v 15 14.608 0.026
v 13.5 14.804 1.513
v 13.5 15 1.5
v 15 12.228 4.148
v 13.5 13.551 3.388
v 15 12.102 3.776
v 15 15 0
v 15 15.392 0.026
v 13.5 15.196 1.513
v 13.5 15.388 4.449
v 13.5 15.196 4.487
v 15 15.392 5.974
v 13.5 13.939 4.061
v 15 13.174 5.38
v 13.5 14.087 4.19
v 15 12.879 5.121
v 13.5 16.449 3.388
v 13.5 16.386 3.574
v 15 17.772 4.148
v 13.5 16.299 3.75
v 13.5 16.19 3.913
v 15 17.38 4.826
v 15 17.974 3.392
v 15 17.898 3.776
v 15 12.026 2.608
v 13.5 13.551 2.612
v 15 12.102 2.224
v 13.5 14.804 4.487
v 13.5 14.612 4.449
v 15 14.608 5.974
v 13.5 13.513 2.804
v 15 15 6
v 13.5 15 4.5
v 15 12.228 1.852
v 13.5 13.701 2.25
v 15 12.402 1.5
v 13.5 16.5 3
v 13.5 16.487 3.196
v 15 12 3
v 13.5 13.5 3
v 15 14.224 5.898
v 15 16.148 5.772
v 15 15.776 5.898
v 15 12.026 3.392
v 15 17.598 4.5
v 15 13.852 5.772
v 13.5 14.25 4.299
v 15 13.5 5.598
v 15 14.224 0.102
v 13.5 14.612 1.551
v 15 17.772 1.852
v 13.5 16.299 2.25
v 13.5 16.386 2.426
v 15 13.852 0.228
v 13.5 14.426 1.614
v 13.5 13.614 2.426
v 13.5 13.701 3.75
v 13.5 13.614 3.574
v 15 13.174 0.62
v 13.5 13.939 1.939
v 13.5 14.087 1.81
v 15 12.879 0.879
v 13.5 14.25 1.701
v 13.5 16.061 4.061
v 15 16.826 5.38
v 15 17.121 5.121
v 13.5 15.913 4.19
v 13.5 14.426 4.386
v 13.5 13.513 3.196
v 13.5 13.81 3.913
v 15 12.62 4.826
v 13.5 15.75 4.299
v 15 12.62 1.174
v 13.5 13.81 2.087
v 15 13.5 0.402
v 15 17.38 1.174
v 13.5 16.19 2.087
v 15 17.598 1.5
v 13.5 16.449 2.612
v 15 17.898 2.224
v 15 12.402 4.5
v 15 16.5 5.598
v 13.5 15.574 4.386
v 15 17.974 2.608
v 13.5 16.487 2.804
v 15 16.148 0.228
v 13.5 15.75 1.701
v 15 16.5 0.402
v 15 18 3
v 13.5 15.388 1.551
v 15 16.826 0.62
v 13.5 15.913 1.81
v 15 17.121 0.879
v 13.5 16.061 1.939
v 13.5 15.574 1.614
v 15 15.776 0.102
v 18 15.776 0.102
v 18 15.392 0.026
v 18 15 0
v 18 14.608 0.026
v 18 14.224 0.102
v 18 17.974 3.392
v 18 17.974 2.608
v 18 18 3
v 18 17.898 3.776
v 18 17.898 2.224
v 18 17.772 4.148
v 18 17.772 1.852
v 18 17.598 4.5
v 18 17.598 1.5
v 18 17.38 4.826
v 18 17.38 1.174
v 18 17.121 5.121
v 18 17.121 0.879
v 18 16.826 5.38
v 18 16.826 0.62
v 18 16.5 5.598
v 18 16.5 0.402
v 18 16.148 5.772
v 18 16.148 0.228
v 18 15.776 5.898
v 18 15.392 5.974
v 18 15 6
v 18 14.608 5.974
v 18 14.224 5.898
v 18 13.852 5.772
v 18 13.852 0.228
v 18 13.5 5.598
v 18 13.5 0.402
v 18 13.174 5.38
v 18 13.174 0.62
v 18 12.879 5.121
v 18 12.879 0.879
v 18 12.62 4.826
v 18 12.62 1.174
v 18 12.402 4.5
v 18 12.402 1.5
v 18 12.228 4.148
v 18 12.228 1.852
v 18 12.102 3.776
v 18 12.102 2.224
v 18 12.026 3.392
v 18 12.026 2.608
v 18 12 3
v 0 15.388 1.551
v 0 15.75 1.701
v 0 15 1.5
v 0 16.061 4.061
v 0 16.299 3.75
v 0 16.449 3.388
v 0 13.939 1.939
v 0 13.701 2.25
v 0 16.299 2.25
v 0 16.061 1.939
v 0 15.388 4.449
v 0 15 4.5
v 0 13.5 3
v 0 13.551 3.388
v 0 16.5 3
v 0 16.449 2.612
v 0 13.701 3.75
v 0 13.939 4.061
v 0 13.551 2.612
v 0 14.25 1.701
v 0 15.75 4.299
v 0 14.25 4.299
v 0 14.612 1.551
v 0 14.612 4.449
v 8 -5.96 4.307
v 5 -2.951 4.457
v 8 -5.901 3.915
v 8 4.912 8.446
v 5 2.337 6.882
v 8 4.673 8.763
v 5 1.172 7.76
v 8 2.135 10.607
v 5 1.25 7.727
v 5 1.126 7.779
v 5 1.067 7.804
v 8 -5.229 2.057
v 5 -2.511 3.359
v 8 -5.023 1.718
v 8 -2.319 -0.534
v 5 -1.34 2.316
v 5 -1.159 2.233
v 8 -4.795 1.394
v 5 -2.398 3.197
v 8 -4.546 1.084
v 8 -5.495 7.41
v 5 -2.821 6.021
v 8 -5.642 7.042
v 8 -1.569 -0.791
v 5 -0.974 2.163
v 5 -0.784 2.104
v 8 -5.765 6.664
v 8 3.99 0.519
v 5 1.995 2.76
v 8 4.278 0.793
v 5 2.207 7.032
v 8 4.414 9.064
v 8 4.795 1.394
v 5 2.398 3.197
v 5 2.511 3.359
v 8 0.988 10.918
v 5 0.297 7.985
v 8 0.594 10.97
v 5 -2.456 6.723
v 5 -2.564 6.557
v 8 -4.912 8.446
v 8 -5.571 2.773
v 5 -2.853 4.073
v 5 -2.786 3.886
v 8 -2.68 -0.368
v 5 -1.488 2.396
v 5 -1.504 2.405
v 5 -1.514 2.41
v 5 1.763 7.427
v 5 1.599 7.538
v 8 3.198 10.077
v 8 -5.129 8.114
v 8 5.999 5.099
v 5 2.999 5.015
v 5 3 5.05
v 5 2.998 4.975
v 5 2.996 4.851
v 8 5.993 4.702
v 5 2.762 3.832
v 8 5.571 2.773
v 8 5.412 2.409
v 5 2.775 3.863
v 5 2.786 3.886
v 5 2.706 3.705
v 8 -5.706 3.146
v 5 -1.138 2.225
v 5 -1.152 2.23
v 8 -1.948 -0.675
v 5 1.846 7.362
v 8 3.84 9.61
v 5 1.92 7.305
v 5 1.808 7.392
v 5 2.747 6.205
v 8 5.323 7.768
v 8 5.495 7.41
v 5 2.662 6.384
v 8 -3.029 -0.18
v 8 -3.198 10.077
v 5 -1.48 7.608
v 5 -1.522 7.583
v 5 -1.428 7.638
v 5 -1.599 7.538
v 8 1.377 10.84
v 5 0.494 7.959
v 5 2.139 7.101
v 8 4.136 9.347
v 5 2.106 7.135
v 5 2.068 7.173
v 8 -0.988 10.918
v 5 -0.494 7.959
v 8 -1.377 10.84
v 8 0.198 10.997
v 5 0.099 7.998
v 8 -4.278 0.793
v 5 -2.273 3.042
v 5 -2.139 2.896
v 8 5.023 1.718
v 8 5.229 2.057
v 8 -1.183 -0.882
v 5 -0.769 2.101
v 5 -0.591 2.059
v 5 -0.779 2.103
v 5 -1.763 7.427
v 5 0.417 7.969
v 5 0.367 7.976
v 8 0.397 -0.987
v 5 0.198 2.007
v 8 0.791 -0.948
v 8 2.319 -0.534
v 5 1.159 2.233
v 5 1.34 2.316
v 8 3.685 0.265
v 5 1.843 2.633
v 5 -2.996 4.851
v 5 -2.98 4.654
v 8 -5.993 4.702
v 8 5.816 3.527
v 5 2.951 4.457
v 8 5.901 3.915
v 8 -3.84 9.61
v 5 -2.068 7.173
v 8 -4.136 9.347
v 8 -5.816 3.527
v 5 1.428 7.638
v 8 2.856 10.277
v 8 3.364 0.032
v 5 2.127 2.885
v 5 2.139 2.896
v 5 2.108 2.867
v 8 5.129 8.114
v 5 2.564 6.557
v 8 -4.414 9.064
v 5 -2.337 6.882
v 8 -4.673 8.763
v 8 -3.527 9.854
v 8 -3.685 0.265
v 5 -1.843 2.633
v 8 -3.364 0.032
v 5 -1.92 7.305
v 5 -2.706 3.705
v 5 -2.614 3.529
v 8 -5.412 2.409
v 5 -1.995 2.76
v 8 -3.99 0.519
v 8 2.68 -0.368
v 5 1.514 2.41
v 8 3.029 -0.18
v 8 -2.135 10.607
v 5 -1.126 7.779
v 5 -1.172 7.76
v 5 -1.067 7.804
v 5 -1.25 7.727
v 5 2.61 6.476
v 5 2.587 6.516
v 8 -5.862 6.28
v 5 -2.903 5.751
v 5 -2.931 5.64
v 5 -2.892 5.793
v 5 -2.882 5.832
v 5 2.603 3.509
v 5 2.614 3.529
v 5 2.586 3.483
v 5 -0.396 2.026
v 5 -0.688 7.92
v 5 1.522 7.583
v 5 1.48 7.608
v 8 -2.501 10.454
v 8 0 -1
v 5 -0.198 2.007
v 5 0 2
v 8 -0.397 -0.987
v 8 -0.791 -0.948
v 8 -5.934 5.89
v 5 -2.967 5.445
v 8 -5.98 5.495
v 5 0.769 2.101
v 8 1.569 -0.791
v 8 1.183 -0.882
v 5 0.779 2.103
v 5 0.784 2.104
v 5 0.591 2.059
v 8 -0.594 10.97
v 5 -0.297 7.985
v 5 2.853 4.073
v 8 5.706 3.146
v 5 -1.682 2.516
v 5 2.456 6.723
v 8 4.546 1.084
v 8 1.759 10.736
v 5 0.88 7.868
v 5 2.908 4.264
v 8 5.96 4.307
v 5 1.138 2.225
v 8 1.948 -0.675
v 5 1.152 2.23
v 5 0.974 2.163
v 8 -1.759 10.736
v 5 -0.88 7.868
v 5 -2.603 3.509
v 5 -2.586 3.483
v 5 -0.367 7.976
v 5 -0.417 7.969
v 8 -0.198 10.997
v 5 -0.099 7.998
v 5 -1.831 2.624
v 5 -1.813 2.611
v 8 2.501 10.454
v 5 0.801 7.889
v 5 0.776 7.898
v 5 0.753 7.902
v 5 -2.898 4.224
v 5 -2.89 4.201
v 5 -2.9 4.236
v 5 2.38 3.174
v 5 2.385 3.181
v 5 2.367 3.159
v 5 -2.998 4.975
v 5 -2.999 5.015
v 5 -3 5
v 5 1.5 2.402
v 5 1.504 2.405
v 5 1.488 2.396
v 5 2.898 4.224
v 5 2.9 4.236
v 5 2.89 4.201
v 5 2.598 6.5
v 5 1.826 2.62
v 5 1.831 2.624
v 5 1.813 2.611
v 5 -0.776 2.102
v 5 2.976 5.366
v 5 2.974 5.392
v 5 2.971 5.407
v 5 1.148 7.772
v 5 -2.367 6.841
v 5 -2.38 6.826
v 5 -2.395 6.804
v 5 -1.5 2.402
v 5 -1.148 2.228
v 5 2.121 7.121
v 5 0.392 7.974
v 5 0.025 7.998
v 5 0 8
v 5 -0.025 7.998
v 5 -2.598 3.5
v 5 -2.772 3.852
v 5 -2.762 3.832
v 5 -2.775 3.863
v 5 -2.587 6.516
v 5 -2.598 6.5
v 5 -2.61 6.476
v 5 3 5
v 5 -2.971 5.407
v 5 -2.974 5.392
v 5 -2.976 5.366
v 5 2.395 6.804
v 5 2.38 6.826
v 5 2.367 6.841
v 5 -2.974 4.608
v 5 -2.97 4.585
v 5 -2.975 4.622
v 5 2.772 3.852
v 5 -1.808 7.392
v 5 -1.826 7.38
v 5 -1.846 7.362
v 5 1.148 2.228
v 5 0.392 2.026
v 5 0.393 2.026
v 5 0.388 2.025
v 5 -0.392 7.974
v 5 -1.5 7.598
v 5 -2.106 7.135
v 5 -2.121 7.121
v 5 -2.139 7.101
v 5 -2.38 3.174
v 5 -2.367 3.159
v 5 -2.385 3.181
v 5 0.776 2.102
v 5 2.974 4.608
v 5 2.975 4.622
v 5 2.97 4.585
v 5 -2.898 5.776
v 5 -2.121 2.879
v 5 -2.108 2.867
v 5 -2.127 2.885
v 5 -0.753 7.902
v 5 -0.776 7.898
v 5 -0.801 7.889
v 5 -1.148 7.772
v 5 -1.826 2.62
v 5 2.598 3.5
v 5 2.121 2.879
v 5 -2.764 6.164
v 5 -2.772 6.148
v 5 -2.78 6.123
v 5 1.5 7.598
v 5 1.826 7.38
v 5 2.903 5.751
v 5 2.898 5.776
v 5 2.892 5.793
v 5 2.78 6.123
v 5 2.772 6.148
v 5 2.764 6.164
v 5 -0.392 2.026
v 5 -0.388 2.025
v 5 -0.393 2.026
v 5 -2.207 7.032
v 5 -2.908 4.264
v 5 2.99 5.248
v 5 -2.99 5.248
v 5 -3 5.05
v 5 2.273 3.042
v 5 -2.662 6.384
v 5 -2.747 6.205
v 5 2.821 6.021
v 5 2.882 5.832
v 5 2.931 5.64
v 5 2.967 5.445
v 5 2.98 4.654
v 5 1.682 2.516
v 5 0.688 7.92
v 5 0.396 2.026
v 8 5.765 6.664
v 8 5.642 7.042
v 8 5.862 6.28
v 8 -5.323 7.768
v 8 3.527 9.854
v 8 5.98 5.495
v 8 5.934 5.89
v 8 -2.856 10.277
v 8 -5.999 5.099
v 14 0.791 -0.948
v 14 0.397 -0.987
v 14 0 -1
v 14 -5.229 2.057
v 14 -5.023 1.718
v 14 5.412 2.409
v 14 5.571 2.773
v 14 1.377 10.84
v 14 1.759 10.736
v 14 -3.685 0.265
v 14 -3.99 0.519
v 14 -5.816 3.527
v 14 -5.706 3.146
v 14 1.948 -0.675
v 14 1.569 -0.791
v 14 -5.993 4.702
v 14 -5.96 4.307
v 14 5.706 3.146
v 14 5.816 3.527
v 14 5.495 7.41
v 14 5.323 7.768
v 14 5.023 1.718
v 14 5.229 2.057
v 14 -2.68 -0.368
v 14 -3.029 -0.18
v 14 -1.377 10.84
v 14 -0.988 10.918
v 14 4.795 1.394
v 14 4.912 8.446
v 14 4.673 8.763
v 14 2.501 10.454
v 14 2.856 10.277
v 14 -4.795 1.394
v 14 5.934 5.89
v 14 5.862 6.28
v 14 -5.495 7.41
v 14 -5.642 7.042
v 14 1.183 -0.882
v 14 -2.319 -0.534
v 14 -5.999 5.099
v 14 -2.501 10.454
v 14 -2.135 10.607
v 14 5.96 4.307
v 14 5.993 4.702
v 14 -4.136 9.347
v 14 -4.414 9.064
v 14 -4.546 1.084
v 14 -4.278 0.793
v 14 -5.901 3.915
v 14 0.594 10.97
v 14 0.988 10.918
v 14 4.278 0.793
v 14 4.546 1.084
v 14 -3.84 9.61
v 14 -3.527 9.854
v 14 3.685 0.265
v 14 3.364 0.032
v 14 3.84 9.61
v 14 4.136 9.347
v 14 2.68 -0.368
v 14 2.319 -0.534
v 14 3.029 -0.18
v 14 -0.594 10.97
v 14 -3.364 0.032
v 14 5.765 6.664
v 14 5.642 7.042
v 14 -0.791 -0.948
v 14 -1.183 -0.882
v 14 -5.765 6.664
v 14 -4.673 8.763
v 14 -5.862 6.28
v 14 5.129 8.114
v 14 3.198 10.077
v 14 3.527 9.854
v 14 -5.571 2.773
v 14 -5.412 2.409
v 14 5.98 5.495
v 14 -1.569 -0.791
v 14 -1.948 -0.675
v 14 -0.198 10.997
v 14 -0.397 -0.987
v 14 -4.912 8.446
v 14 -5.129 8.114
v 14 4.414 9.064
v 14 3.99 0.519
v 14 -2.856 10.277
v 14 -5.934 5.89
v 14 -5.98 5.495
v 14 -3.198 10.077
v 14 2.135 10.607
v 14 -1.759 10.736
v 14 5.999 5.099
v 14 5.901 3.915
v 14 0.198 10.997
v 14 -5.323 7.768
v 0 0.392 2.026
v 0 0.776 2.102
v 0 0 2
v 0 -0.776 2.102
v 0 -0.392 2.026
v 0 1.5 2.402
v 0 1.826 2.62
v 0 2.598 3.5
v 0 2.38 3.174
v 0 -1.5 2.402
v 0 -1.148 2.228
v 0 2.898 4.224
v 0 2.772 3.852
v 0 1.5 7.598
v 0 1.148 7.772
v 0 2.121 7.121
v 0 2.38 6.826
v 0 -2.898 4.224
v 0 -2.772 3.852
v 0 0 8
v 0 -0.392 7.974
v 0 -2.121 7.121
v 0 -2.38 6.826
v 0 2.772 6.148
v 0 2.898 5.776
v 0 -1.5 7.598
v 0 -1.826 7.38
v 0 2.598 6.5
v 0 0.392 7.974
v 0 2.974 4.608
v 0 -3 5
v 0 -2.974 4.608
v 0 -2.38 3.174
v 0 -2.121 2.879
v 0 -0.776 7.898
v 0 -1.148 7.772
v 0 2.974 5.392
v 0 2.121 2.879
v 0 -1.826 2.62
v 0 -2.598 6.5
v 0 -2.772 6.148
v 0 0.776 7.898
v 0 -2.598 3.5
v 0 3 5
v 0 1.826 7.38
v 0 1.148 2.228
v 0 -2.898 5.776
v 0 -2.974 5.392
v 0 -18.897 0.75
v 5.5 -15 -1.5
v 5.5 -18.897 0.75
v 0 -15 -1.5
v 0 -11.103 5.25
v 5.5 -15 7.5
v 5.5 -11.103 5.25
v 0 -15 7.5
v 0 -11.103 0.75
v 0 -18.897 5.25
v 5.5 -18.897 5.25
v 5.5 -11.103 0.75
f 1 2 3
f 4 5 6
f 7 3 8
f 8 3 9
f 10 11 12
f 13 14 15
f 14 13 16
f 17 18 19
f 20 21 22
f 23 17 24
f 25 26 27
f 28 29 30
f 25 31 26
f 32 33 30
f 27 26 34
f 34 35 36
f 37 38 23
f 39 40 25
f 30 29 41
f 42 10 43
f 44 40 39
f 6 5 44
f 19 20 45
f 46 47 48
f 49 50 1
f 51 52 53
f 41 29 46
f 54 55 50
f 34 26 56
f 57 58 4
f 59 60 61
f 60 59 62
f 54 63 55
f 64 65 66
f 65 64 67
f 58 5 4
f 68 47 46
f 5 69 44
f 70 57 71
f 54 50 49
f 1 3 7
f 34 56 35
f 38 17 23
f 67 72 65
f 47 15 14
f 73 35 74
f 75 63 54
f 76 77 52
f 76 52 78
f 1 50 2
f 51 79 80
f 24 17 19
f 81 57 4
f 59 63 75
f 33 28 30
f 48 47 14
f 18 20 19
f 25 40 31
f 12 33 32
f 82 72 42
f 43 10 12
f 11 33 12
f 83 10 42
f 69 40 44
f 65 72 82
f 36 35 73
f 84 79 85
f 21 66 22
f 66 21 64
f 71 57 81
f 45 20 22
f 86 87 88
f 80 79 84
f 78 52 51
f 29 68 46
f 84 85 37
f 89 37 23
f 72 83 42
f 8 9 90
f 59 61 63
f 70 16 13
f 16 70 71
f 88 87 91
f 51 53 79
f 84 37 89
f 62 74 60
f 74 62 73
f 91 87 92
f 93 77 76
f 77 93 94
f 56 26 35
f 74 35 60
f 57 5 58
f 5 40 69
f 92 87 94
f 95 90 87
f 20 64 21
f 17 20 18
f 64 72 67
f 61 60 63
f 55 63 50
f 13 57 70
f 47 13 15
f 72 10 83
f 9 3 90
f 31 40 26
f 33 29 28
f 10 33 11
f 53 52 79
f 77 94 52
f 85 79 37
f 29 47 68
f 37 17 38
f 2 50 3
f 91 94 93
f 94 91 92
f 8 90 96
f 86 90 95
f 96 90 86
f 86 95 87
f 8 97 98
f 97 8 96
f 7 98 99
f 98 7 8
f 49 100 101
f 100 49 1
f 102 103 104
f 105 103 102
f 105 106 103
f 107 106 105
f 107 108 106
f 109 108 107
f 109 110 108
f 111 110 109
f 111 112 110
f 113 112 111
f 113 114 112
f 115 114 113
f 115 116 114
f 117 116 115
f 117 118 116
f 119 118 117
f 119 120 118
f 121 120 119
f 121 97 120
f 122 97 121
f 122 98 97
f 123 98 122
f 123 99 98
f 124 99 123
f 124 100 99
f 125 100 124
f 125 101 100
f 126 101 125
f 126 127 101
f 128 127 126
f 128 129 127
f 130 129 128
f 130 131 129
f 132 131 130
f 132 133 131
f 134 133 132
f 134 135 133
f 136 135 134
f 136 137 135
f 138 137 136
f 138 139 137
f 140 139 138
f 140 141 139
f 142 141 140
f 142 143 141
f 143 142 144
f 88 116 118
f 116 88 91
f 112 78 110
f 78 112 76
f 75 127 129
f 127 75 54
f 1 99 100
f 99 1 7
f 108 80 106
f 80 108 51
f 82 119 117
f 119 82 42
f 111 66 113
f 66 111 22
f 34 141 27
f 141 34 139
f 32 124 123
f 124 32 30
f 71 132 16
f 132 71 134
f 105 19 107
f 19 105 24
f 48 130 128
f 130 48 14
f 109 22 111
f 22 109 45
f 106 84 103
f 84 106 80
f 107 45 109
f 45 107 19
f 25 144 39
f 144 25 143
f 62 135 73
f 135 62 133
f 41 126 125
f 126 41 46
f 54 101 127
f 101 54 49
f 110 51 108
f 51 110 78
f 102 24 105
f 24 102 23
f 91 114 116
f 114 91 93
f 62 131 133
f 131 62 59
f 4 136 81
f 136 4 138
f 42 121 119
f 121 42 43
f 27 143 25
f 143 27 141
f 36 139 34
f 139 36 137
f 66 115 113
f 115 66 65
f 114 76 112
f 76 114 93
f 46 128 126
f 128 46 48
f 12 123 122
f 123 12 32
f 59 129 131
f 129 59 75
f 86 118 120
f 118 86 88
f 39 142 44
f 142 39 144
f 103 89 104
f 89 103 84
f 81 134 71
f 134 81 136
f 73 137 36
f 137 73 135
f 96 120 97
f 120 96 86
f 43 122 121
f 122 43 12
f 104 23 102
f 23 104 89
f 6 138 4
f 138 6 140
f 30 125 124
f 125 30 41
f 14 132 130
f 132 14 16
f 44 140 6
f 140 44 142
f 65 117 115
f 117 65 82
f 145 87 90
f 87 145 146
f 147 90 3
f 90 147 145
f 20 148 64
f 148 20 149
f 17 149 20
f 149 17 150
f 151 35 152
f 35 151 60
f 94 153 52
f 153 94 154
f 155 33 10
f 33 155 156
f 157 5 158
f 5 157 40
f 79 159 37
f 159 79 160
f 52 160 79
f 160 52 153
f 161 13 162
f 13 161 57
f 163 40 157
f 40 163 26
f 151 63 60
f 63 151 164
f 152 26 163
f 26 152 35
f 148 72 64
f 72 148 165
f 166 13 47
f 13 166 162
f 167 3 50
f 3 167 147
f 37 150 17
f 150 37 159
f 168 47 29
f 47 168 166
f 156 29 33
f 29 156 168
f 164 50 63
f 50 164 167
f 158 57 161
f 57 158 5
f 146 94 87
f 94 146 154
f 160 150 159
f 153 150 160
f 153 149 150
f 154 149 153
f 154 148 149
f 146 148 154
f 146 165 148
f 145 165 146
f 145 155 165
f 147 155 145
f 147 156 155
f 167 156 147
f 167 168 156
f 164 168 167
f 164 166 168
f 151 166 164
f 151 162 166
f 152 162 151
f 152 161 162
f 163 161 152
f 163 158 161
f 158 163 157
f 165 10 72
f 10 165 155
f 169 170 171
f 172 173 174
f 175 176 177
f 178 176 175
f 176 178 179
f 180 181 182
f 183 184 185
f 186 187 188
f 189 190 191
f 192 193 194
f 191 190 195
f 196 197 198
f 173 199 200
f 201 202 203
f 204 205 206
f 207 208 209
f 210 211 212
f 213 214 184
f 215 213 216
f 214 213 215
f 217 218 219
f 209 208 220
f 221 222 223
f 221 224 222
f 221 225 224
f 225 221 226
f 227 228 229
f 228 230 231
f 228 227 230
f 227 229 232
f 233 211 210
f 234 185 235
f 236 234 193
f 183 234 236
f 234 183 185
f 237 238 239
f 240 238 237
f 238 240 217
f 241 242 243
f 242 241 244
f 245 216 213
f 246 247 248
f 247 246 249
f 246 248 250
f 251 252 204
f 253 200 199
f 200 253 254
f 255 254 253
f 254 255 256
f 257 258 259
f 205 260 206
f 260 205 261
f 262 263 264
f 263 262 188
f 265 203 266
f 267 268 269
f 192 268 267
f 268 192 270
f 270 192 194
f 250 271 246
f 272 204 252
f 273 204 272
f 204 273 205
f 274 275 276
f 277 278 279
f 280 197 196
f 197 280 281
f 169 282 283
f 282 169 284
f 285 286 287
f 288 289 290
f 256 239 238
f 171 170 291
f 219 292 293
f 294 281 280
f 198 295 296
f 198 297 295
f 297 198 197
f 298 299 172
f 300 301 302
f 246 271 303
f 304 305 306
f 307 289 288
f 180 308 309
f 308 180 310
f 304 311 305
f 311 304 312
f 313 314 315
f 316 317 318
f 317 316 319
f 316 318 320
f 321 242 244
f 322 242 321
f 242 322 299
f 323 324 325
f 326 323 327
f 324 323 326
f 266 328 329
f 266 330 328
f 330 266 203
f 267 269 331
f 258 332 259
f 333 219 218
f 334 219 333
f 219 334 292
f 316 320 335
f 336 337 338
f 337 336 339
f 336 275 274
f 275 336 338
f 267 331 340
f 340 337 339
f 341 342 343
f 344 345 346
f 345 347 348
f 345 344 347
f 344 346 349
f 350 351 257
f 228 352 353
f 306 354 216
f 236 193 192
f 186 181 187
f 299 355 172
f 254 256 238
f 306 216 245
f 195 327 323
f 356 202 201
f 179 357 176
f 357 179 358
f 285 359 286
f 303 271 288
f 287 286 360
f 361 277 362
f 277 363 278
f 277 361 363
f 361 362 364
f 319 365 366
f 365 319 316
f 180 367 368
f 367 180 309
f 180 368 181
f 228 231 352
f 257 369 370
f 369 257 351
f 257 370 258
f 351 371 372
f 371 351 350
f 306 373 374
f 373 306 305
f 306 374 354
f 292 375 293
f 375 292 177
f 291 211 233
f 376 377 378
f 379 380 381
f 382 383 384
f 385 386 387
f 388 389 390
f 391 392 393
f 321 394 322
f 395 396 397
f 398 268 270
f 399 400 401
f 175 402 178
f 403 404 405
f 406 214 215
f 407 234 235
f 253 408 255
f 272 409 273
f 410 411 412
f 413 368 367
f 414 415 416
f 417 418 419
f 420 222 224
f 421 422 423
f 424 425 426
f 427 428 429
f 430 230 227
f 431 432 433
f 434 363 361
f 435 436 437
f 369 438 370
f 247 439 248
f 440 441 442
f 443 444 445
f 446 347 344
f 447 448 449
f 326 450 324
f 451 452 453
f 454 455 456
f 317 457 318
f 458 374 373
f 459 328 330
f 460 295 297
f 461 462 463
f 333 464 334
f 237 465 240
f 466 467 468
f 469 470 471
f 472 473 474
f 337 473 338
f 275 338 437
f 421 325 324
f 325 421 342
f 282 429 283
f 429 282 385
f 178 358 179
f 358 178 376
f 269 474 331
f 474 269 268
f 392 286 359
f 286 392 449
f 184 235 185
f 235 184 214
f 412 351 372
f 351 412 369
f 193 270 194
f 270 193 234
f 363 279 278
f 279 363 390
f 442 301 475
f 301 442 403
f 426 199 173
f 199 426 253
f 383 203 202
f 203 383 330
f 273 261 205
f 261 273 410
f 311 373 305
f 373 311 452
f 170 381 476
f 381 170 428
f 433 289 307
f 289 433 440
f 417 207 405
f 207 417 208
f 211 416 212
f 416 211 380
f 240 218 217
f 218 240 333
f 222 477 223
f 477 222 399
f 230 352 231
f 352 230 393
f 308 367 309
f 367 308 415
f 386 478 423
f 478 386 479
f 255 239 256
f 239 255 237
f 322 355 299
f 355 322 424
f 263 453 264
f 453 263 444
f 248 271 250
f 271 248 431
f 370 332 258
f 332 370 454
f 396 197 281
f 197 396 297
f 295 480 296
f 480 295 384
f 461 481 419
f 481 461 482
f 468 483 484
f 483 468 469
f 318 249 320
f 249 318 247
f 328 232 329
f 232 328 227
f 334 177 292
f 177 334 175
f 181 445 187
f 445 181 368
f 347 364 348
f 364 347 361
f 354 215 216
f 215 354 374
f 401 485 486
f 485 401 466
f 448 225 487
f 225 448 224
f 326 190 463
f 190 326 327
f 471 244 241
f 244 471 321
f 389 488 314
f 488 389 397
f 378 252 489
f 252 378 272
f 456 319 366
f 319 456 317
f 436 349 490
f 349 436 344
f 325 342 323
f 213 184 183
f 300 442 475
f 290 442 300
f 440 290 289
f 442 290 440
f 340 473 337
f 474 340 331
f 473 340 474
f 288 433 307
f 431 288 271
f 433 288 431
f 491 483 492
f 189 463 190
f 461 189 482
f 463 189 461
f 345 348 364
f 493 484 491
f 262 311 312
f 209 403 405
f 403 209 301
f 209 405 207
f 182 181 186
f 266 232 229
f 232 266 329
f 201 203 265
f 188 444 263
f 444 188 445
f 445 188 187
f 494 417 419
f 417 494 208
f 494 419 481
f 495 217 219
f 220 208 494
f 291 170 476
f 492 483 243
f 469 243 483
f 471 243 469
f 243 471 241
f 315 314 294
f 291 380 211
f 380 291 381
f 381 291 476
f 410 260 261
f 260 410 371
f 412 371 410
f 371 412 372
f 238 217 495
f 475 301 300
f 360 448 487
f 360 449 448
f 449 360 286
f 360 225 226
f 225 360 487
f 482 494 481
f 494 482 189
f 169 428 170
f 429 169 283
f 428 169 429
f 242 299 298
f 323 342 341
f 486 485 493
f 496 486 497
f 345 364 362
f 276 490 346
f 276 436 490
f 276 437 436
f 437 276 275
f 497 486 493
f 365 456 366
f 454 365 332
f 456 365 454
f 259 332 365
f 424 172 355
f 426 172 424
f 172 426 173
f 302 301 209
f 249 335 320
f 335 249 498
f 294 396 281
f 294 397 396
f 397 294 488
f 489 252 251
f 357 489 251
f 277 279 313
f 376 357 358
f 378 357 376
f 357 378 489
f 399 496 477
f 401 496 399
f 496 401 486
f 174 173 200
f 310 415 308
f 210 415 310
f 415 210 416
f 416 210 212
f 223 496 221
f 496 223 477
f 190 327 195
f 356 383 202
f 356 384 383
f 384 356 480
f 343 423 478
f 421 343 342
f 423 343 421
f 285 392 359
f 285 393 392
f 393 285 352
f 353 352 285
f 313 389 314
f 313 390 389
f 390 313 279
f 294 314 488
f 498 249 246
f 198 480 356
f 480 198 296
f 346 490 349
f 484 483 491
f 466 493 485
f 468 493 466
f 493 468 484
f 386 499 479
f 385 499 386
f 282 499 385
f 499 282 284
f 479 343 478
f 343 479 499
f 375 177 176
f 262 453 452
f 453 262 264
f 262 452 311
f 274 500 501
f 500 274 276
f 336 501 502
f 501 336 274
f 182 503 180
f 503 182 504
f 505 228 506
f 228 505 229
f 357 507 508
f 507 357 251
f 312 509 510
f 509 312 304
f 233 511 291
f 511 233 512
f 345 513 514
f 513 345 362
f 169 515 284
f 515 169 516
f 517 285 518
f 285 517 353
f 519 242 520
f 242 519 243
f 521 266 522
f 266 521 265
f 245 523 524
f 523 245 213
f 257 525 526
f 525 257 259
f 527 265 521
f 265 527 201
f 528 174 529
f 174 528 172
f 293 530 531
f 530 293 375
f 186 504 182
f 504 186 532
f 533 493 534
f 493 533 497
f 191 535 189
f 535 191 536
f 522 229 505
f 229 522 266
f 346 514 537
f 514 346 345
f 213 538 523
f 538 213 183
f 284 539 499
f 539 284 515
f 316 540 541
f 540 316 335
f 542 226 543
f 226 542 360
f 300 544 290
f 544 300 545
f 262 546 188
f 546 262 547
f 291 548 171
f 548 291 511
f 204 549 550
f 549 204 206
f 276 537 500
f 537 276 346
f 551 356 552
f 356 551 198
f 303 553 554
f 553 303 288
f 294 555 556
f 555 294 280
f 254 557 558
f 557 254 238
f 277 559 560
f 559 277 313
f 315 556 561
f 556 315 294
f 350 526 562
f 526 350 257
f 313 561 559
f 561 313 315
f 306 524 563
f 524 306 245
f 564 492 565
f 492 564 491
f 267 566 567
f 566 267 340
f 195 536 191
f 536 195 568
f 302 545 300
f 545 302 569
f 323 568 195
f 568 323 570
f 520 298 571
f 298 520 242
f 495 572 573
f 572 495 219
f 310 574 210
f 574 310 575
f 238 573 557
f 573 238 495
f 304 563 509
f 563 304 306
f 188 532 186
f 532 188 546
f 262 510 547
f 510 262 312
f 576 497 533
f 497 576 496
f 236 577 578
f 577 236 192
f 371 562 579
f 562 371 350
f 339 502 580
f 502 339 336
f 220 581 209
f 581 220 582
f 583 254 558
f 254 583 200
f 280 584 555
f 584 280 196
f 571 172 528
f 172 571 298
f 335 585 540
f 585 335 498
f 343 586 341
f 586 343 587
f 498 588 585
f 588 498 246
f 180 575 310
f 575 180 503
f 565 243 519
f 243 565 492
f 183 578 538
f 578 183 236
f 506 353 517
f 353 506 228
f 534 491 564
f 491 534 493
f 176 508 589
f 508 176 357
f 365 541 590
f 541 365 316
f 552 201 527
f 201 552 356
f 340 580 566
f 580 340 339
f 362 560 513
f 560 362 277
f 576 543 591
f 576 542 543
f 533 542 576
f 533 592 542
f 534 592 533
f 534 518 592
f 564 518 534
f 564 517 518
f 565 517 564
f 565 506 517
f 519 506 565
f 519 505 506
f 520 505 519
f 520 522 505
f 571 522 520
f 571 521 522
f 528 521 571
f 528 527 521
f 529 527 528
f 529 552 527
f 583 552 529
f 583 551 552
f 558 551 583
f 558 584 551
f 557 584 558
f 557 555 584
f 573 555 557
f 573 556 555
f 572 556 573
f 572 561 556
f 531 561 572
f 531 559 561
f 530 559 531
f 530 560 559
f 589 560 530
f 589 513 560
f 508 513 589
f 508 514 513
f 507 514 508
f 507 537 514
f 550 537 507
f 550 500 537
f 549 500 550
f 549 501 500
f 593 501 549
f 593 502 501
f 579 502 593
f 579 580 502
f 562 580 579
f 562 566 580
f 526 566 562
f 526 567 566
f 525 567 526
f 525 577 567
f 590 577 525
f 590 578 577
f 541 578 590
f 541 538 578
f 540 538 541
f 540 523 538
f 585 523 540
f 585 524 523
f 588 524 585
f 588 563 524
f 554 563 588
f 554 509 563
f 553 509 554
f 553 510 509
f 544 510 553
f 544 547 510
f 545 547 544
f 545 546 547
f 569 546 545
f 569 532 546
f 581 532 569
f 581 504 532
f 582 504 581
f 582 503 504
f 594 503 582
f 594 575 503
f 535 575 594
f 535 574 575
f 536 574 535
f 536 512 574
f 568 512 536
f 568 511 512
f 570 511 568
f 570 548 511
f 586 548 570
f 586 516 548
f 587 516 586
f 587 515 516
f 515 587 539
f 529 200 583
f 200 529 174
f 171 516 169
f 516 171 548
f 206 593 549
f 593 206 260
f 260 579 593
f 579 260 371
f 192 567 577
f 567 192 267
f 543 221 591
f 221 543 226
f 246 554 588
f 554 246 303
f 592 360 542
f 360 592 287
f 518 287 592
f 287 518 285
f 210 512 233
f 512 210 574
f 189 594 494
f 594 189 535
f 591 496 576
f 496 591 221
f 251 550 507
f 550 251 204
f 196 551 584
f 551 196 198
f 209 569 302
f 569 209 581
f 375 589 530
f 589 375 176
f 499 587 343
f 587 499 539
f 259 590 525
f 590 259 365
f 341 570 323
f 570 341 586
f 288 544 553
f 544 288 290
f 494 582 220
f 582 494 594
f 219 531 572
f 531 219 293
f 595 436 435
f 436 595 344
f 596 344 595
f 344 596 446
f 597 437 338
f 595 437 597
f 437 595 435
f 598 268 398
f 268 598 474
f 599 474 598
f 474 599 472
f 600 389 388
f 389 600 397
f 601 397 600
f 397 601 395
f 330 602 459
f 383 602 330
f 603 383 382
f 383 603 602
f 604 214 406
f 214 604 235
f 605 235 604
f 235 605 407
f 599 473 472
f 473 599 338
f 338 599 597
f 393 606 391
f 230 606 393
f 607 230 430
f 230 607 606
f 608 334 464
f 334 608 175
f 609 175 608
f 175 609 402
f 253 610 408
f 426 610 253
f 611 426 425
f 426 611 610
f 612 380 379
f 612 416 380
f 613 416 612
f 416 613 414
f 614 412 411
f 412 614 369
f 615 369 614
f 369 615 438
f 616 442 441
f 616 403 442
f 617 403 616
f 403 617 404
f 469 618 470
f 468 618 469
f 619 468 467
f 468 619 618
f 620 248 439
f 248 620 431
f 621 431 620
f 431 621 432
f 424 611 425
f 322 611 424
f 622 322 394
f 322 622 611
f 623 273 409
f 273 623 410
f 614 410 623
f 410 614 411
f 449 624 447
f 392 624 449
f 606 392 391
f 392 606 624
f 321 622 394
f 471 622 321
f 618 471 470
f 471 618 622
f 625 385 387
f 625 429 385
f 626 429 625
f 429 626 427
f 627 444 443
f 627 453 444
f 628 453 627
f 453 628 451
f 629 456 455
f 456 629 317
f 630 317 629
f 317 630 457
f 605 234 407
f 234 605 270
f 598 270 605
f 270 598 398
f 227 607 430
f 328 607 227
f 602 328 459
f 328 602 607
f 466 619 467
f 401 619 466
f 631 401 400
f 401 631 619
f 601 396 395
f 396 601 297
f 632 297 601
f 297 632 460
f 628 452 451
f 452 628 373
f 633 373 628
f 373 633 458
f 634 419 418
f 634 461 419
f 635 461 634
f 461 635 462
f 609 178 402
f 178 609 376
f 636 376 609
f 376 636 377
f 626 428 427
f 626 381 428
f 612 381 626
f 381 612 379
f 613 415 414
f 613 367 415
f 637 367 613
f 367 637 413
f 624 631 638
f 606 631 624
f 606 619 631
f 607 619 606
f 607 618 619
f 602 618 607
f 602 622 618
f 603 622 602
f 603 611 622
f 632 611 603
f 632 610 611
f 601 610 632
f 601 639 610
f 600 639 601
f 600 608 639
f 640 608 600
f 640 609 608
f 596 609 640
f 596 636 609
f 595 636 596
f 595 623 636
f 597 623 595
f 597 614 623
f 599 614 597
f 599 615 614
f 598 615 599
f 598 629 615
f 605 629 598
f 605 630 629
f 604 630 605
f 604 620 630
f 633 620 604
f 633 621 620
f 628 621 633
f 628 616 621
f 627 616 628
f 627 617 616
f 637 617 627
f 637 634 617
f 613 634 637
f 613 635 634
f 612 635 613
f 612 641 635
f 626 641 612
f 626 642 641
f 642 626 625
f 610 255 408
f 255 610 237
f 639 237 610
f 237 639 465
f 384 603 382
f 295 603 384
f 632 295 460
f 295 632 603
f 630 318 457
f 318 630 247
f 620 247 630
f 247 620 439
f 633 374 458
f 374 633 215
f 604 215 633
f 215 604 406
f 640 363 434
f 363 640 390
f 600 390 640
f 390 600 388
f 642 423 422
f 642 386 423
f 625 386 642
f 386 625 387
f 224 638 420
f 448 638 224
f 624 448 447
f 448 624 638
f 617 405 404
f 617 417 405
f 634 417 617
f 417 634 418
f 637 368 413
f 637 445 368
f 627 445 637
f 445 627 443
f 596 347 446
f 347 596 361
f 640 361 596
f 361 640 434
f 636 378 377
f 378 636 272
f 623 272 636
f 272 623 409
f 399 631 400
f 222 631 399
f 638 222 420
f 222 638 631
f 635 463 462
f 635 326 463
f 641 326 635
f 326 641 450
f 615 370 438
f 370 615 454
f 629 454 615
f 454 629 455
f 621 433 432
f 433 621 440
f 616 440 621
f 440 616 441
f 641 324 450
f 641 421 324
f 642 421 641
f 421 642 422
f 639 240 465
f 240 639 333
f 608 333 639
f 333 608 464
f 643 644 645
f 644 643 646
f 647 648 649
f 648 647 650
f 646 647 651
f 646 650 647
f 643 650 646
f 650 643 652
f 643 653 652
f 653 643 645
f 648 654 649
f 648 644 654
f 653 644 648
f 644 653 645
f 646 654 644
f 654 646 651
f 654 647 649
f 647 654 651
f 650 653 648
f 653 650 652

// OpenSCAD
$fa = 1;
$fs = 0.4;

module bevelled_screw_hole(diameter=3,depth=15,location=[0.0,0.0,0.0],rotation=[0.0,0.0,0.0]) {
    R=diameter/2.0;
    translate(location) {
        rotate(rotation){
            union(){
                translate([0,0,depth-R]) {
                    cylinder(h=R,
                            r1=R,
                            r2=R*2,
                            center=false);
                }
                translate([0,0,depth]) {
                    cylinder(h=R*2,r=R*2,center=false);
                }
                cylinder(h=depth-R,r=R,center=false);
           }
        }
    }
}

bevelled_screw_hole(rotation=[0,90,0],location=[0,15,3]);
bevelled_screw_hole(diameter=6,depth=8,rotation=[0,90,0],location=[0,0,5]);
//bevelled_screw_hole(rotation=[0,90,0],location=[0,-15,3]);

module captive_nut_hole(diameter=3,depth=15,location=[0.0,0.0,0.0],rotation=[0.0,0.0,0.0]) {
    translate(location) {
        rotate(rotation){
            cylinder(d=9.0,h=5.5,center=false,$fn=6);
        }
    }
}

captive_nut_hole(rotation=[0,90,0],location=[0,-15,3]);
